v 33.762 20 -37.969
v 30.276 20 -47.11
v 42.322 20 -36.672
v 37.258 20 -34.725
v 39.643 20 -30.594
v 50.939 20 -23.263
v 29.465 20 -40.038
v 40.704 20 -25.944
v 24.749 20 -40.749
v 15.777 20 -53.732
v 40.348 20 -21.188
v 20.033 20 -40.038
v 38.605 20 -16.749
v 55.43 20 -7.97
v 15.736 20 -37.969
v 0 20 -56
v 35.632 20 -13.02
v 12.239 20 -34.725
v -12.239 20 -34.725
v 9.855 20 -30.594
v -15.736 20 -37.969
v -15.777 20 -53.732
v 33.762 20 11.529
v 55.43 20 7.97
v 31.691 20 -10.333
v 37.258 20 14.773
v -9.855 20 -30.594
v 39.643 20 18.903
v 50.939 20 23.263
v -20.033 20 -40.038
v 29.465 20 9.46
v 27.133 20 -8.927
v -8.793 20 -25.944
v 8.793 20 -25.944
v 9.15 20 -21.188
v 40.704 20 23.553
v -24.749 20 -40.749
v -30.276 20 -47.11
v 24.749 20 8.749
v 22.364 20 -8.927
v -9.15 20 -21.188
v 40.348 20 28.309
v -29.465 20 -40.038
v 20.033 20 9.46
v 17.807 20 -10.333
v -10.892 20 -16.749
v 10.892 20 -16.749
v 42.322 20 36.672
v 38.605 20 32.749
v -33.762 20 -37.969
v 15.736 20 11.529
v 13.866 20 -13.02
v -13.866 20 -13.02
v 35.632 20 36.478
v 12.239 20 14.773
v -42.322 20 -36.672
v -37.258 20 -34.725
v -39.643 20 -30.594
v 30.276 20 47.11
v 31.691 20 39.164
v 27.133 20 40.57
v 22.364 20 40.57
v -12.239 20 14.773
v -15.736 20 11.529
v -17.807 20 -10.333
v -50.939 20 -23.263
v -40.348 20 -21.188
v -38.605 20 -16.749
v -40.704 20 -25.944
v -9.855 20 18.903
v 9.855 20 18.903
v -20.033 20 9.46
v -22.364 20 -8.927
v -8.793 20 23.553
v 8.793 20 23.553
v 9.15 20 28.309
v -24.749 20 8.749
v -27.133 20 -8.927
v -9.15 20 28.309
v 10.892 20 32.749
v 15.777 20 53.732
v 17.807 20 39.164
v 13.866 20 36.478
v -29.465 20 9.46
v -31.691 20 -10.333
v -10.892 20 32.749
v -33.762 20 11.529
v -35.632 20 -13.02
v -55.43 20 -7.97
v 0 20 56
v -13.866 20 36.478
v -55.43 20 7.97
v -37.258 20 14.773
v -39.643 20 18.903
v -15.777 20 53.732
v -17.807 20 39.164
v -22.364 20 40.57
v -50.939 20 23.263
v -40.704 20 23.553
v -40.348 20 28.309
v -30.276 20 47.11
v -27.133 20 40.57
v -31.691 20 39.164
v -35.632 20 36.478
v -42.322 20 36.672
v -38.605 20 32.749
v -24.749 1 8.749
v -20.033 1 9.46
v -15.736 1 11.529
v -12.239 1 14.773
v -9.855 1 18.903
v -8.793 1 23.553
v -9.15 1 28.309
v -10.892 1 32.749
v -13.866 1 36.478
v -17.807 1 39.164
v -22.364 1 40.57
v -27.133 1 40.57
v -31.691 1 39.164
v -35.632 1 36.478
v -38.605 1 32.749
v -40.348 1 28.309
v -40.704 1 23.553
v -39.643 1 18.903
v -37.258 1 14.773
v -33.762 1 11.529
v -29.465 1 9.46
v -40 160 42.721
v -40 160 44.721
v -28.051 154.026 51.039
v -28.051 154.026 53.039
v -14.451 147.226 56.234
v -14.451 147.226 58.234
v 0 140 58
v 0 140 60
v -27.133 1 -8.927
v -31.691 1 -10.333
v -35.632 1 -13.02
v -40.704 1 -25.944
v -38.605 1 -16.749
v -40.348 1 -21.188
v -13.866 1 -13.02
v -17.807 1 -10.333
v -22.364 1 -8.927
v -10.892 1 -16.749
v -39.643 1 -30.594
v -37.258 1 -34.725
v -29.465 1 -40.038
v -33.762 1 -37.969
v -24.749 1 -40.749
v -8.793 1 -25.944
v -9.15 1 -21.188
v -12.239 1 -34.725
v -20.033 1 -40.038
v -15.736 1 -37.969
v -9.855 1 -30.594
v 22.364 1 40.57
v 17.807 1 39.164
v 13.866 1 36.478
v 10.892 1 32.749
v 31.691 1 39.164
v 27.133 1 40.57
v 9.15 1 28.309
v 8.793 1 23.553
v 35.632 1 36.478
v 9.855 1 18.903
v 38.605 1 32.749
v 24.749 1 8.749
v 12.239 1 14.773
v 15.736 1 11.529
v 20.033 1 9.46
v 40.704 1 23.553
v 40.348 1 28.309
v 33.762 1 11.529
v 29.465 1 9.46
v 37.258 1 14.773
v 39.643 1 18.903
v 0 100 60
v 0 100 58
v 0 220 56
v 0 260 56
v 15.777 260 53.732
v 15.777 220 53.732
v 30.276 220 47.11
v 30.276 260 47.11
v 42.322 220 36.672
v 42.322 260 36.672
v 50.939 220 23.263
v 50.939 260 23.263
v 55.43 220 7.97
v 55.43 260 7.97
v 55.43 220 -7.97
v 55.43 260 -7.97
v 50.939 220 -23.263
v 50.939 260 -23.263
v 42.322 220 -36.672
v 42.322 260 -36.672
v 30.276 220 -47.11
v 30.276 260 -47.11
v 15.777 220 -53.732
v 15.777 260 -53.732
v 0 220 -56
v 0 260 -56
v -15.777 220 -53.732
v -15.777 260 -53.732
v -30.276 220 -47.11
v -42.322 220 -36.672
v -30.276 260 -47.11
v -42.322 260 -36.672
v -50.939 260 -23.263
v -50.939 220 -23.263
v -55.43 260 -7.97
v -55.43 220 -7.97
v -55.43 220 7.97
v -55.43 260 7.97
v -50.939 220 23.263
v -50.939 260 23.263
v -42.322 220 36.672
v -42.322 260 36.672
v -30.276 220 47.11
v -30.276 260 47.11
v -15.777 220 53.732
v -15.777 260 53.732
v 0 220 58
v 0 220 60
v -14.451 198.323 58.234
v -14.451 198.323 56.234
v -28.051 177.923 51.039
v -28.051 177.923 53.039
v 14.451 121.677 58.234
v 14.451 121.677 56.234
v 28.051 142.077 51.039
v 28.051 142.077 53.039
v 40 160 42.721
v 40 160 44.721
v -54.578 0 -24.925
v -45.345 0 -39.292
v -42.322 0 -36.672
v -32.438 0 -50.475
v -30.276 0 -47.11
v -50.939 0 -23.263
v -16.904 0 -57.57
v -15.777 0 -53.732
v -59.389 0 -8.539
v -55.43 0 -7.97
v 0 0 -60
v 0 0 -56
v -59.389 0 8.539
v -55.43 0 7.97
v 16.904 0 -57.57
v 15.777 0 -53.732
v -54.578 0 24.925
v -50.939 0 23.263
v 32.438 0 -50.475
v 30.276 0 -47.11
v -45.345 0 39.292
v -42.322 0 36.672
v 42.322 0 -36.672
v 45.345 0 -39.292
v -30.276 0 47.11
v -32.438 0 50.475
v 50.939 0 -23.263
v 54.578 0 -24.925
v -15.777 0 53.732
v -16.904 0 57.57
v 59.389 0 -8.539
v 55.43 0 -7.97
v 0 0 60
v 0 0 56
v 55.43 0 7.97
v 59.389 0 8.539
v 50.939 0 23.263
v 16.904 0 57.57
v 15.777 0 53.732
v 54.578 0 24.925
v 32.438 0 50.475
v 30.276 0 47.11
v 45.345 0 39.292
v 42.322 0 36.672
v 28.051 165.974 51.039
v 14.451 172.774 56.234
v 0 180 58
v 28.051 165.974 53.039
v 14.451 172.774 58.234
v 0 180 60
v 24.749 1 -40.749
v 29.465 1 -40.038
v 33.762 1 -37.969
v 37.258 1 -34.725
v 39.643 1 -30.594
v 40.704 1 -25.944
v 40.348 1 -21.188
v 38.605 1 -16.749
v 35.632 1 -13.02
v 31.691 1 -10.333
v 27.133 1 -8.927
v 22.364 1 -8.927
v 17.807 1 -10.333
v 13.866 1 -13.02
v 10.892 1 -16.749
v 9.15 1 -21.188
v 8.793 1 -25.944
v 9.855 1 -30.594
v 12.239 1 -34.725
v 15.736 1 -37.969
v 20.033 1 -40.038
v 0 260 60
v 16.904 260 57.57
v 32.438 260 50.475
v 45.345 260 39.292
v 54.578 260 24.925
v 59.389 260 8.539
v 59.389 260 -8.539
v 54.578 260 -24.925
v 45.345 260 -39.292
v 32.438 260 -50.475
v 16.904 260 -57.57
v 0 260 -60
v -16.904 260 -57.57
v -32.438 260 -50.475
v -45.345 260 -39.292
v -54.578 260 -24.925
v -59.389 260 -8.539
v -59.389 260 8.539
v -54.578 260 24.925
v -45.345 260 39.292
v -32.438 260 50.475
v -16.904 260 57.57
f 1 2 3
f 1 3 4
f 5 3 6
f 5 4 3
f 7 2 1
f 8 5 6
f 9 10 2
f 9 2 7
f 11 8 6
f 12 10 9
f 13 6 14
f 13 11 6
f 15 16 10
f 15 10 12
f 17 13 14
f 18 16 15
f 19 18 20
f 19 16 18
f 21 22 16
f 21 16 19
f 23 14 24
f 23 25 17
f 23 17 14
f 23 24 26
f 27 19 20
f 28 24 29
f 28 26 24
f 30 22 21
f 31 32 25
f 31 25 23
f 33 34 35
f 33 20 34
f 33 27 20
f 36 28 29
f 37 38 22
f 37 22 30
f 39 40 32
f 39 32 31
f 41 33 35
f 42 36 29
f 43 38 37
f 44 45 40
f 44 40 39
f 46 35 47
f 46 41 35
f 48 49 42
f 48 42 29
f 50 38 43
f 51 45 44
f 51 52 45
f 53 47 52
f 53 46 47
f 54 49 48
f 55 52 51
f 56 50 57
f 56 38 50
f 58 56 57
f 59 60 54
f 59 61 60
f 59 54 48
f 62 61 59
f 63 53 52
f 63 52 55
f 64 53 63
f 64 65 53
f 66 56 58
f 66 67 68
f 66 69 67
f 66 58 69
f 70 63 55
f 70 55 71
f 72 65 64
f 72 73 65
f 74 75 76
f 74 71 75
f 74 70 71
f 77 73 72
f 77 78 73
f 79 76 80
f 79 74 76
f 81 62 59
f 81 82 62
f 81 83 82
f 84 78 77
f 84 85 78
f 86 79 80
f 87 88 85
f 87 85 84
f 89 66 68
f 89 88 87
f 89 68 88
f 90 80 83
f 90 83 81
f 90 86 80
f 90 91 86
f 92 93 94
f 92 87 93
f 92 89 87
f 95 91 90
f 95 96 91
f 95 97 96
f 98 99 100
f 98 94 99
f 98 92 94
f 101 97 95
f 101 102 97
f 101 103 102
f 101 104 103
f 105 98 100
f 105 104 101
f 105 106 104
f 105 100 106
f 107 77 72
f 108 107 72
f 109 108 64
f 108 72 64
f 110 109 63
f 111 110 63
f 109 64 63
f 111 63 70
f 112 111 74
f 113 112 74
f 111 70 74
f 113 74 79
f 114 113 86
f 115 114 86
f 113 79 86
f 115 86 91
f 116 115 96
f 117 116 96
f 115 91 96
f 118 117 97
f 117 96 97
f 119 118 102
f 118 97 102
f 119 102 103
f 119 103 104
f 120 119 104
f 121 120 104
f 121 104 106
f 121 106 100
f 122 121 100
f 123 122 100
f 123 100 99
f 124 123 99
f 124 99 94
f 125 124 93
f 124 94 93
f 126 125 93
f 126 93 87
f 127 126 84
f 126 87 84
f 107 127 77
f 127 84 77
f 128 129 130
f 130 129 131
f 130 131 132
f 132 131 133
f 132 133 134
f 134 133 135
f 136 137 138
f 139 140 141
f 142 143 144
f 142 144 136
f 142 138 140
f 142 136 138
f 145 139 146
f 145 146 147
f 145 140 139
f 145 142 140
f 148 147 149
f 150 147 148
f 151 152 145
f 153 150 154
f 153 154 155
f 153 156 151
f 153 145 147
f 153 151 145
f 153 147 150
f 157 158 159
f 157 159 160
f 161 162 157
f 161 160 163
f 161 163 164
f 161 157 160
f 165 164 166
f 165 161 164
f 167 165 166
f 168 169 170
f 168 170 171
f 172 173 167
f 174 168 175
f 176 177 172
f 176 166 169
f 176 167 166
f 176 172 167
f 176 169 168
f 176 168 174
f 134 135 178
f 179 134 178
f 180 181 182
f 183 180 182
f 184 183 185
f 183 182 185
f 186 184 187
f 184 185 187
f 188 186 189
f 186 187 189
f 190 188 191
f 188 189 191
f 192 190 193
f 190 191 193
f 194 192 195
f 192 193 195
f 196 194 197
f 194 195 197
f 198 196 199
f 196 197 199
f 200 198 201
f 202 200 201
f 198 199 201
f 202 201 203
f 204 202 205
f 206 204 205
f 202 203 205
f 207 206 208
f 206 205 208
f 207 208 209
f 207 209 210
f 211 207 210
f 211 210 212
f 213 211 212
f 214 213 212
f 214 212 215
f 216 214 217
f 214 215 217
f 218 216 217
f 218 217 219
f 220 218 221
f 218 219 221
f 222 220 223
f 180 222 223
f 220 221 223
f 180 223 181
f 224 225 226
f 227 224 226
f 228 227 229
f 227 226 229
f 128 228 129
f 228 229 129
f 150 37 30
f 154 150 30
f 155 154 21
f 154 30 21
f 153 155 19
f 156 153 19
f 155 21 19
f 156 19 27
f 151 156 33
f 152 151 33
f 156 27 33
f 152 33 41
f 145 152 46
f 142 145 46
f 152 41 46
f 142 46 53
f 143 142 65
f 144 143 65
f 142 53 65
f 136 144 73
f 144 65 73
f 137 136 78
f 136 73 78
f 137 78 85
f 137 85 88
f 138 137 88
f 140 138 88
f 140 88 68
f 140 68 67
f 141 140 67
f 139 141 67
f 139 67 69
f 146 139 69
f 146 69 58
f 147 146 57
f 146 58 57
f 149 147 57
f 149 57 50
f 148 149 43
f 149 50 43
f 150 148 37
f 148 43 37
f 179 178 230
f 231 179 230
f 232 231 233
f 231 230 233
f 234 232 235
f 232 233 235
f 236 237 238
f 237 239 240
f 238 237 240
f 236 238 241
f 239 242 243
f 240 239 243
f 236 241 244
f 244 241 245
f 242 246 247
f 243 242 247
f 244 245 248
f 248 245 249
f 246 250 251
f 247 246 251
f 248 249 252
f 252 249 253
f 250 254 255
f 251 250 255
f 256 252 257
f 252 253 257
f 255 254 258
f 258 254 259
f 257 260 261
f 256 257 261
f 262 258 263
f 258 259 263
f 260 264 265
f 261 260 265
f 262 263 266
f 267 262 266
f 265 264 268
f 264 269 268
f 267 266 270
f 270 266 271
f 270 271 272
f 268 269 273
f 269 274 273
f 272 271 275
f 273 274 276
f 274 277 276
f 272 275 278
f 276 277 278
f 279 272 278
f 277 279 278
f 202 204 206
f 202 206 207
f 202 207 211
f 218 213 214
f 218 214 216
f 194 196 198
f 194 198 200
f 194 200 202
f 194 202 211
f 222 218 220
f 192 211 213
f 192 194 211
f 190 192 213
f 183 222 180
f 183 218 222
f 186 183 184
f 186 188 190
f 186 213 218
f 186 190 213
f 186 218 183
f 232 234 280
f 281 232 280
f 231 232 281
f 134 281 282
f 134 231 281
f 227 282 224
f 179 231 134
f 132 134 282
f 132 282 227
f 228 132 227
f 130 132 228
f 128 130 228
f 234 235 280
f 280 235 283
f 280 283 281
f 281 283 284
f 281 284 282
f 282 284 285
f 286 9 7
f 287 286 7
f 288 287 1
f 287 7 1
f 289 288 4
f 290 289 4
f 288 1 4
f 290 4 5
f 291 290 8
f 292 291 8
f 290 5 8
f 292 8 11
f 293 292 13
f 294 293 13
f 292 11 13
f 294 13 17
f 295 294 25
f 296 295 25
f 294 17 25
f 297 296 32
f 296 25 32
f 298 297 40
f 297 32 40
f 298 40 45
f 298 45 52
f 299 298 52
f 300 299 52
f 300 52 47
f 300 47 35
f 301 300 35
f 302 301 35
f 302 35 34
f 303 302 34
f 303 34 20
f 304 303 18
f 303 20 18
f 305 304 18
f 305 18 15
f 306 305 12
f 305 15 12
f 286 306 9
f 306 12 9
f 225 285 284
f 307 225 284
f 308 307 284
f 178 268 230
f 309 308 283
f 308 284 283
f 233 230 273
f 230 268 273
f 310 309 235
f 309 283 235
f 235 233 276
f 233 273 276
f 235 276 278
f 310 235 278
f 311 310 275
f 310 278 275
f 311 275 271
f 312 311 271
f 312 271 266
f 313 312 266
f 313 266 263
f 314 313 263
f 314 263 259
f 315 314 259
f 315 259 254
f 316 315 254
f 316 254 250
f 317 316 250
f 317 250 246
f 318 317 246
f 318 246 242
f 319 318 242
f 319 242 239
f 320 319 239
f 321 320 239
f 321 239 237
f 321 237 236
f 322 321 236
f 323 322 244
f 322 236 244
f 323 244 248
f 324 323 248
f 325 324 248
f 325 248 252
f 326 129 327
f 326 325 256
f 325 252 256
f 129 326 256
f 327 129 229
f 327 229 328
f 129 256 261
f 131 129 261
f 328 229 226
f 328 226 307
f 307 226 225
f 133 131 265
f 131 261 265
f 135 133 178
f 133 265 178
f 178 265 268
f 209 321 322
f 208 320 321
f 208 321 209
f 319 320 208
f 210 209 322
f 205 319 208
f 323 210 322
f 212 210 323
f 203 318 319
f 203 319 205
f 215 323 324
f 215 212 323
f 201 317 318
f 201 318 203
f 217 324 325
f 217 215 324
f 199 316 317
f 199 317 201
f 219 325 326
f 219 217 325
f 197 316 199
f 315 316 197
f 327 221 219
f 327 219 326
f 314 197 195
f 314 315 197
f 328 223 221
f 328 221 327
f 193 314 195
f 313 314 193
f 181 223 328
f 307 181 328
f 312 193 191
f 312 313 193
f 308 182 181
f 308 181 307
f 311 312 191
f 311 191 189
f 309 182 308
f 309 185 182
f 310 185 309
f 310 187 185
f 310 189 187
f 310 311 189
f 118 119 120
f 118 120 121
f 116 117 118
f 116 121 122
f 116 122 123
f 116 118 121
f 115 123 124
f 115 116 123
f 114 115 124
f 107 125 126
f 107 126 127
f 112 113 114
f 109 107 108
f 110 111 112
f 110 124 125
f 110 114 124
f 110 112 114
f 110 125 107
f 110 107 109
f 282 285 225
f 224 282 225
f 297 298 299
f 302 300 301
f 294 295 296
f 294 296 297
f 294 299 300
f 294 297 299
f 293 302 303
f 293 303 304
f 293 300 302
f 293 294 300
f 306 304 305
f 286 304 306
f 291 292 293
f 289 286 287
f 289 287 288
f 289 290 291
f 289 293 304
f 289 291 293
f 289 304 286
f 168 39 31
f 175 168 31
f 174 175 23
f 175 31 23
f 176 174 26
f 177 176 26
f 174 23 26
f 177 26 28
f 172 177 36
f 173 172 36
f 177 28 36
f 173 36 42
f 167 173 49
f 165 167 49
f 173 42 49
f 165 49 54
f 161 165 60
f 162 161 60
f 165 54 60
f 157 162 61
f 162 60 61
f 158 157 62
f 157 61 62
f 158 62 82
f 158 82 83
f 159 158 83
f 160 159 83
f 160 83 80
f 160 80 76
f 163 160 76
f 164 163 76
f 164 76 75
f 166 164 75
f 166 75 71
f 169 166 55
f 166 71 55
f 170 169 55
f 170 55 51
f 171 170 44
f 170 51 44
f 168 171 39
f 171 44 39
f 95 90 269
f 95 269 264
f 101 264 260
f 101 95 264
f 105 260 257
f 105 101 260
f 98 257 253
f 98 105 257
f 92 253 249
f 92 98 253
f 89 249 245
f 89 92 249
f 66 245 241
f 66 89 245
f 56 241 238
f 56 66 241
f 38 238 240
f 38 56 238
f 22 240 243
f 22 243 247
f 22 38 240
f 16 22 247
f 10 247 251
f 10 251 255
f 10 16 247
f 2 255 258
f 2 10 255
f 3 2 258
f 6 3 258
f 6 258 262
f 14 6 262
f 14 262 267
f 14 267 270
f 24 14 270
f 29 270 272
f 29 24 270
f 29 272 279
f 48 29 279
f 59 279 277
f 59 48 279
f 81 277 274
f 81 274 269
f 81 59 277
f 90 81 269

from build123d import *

# Parameters (mm, degrees)
SKETCH1_R                   = 60
MAIN_EXTRUDE_DEPTH          = 260
SKETCH2_R                   = 56
HOLE_FOR_BLADE_CASING_DEPTH = 40
HOLE_START                  = -20
SKETCH3_R                   = 56
HOLE_TO_HIDE_LEGS_DEPTH     = 20
LIGHTNING_BOLT_REACH        = 296.575
LIGHTNING_BOLT_START_RADIUS = 60
LIGHTNING_BOLT_END_RADIUS   = 60
SKETCH5_R                   = 16
LEGS_DEPTH                  = 19


with BuildPart() as part:
    # Sketch1 → Main Extrude (new body)
    with BuildSketch(Plane(origin=(0, 0, 0), x_dir=(1, 0, 0), z_dir=(0, 1, 0))):
        with Locations(Location((0, 0, 0), (0, 0, 270))):
            Circle(SKETCH1_R)
    extrude(amount=MAIN_EXTRUDE_DEPTH)

    # Sketch2 → Hole for Blade Casing (cut)
    with BuildSketch(Plane(origin=(0, 260, 0), x_dir=(1, 0, 0), z_dir=(0, 1, 0))):
        with Locations(Location((0, 0, 0), (0, 0, 270))):
            Circle(SKETCH2_R)
    extrude(amount=-HOLE_FOR_BLADE_CASING_DEPTH, mode=Mode.SUBTRACT)

    # Sketch3 → Hole to Hide Legs (cut)
    with BuildSketch(Plane.XZ.offset(HOLE_START)):
        with Locations(Location((0, 0, 0), (0, 0, 90))):
            Circle(SKETCH3_R)
    extrude(amount=HOLE_TO_HIDE_LEGS_DEPTH, mode=Mode.SUBTRACT)

    # Lightning Bolt: from a cylinder face, 296.575 long prism both ways, kept between that surface and its translate by the depth
    lightning_bolt_start = Plane(origin=(0, 160, 0), z_dir=(0, -1, 0)) * Cylinder(LIGHTNING_BOLT_START_RADIUS, 714.15, mode=Mode.PRIVATE)
    lightning_bolt_end = Plane(origin=(0, 160, -2), z_dir=(0, -1, 0)) * Cylinder(LIGHTNING_BOLT_END_RADIUS, 714.15, mode=Mode.PRIVATE)
    # Sketch4 → Lightning Bolt (cut, from a surface)
    with BuildSketch(Plane.XY.offset(60), mode=Mode.PRIVATE) as lightning_bolt_sk1:
        Polygon((0, 220), (-40, 160), (0, 140), (0, 100), (40, 160), (0, 180), align=None)
    lightning_bolt_tool1 = extrude(lightning_bolt_sk1.sketch, amount=LIGHTNING_BOLT_REACH, both=True, mode=Mode.PRIVATE)
    add(((lightning_bolt_tool1 & lightning_bolt_start) - lightning_bolt_end).solids().sort_by_distance((0, 160, 51.36068))[0], mode=Mode.SUBTRACT)

    # Sketch5 → Legs (add)
    with BuildSketch(Plane.XZ.offset(-20)):
        with Locations(Location((-24.748737342, 24.748737342, 0), (0, 0, 270))):
            Circle(SKETCH5_R)
        with Locations(Location((24.748737342, 24.748737342, 0), (0, 0, 270))):
            Circle(SKETCH5_R)
        with Locations(Location((24.748737342, -24.748737342, 0), (0, 0, 270))):
            Circle(SKETCH5_R)
        with Locations(Location((-24.748737342, -24.748737342, 0), (0, 0, 270))):
            Circle(SKETCH5_R)
    extrude(amount=LEGS_DEPTH)


solid = part.part
